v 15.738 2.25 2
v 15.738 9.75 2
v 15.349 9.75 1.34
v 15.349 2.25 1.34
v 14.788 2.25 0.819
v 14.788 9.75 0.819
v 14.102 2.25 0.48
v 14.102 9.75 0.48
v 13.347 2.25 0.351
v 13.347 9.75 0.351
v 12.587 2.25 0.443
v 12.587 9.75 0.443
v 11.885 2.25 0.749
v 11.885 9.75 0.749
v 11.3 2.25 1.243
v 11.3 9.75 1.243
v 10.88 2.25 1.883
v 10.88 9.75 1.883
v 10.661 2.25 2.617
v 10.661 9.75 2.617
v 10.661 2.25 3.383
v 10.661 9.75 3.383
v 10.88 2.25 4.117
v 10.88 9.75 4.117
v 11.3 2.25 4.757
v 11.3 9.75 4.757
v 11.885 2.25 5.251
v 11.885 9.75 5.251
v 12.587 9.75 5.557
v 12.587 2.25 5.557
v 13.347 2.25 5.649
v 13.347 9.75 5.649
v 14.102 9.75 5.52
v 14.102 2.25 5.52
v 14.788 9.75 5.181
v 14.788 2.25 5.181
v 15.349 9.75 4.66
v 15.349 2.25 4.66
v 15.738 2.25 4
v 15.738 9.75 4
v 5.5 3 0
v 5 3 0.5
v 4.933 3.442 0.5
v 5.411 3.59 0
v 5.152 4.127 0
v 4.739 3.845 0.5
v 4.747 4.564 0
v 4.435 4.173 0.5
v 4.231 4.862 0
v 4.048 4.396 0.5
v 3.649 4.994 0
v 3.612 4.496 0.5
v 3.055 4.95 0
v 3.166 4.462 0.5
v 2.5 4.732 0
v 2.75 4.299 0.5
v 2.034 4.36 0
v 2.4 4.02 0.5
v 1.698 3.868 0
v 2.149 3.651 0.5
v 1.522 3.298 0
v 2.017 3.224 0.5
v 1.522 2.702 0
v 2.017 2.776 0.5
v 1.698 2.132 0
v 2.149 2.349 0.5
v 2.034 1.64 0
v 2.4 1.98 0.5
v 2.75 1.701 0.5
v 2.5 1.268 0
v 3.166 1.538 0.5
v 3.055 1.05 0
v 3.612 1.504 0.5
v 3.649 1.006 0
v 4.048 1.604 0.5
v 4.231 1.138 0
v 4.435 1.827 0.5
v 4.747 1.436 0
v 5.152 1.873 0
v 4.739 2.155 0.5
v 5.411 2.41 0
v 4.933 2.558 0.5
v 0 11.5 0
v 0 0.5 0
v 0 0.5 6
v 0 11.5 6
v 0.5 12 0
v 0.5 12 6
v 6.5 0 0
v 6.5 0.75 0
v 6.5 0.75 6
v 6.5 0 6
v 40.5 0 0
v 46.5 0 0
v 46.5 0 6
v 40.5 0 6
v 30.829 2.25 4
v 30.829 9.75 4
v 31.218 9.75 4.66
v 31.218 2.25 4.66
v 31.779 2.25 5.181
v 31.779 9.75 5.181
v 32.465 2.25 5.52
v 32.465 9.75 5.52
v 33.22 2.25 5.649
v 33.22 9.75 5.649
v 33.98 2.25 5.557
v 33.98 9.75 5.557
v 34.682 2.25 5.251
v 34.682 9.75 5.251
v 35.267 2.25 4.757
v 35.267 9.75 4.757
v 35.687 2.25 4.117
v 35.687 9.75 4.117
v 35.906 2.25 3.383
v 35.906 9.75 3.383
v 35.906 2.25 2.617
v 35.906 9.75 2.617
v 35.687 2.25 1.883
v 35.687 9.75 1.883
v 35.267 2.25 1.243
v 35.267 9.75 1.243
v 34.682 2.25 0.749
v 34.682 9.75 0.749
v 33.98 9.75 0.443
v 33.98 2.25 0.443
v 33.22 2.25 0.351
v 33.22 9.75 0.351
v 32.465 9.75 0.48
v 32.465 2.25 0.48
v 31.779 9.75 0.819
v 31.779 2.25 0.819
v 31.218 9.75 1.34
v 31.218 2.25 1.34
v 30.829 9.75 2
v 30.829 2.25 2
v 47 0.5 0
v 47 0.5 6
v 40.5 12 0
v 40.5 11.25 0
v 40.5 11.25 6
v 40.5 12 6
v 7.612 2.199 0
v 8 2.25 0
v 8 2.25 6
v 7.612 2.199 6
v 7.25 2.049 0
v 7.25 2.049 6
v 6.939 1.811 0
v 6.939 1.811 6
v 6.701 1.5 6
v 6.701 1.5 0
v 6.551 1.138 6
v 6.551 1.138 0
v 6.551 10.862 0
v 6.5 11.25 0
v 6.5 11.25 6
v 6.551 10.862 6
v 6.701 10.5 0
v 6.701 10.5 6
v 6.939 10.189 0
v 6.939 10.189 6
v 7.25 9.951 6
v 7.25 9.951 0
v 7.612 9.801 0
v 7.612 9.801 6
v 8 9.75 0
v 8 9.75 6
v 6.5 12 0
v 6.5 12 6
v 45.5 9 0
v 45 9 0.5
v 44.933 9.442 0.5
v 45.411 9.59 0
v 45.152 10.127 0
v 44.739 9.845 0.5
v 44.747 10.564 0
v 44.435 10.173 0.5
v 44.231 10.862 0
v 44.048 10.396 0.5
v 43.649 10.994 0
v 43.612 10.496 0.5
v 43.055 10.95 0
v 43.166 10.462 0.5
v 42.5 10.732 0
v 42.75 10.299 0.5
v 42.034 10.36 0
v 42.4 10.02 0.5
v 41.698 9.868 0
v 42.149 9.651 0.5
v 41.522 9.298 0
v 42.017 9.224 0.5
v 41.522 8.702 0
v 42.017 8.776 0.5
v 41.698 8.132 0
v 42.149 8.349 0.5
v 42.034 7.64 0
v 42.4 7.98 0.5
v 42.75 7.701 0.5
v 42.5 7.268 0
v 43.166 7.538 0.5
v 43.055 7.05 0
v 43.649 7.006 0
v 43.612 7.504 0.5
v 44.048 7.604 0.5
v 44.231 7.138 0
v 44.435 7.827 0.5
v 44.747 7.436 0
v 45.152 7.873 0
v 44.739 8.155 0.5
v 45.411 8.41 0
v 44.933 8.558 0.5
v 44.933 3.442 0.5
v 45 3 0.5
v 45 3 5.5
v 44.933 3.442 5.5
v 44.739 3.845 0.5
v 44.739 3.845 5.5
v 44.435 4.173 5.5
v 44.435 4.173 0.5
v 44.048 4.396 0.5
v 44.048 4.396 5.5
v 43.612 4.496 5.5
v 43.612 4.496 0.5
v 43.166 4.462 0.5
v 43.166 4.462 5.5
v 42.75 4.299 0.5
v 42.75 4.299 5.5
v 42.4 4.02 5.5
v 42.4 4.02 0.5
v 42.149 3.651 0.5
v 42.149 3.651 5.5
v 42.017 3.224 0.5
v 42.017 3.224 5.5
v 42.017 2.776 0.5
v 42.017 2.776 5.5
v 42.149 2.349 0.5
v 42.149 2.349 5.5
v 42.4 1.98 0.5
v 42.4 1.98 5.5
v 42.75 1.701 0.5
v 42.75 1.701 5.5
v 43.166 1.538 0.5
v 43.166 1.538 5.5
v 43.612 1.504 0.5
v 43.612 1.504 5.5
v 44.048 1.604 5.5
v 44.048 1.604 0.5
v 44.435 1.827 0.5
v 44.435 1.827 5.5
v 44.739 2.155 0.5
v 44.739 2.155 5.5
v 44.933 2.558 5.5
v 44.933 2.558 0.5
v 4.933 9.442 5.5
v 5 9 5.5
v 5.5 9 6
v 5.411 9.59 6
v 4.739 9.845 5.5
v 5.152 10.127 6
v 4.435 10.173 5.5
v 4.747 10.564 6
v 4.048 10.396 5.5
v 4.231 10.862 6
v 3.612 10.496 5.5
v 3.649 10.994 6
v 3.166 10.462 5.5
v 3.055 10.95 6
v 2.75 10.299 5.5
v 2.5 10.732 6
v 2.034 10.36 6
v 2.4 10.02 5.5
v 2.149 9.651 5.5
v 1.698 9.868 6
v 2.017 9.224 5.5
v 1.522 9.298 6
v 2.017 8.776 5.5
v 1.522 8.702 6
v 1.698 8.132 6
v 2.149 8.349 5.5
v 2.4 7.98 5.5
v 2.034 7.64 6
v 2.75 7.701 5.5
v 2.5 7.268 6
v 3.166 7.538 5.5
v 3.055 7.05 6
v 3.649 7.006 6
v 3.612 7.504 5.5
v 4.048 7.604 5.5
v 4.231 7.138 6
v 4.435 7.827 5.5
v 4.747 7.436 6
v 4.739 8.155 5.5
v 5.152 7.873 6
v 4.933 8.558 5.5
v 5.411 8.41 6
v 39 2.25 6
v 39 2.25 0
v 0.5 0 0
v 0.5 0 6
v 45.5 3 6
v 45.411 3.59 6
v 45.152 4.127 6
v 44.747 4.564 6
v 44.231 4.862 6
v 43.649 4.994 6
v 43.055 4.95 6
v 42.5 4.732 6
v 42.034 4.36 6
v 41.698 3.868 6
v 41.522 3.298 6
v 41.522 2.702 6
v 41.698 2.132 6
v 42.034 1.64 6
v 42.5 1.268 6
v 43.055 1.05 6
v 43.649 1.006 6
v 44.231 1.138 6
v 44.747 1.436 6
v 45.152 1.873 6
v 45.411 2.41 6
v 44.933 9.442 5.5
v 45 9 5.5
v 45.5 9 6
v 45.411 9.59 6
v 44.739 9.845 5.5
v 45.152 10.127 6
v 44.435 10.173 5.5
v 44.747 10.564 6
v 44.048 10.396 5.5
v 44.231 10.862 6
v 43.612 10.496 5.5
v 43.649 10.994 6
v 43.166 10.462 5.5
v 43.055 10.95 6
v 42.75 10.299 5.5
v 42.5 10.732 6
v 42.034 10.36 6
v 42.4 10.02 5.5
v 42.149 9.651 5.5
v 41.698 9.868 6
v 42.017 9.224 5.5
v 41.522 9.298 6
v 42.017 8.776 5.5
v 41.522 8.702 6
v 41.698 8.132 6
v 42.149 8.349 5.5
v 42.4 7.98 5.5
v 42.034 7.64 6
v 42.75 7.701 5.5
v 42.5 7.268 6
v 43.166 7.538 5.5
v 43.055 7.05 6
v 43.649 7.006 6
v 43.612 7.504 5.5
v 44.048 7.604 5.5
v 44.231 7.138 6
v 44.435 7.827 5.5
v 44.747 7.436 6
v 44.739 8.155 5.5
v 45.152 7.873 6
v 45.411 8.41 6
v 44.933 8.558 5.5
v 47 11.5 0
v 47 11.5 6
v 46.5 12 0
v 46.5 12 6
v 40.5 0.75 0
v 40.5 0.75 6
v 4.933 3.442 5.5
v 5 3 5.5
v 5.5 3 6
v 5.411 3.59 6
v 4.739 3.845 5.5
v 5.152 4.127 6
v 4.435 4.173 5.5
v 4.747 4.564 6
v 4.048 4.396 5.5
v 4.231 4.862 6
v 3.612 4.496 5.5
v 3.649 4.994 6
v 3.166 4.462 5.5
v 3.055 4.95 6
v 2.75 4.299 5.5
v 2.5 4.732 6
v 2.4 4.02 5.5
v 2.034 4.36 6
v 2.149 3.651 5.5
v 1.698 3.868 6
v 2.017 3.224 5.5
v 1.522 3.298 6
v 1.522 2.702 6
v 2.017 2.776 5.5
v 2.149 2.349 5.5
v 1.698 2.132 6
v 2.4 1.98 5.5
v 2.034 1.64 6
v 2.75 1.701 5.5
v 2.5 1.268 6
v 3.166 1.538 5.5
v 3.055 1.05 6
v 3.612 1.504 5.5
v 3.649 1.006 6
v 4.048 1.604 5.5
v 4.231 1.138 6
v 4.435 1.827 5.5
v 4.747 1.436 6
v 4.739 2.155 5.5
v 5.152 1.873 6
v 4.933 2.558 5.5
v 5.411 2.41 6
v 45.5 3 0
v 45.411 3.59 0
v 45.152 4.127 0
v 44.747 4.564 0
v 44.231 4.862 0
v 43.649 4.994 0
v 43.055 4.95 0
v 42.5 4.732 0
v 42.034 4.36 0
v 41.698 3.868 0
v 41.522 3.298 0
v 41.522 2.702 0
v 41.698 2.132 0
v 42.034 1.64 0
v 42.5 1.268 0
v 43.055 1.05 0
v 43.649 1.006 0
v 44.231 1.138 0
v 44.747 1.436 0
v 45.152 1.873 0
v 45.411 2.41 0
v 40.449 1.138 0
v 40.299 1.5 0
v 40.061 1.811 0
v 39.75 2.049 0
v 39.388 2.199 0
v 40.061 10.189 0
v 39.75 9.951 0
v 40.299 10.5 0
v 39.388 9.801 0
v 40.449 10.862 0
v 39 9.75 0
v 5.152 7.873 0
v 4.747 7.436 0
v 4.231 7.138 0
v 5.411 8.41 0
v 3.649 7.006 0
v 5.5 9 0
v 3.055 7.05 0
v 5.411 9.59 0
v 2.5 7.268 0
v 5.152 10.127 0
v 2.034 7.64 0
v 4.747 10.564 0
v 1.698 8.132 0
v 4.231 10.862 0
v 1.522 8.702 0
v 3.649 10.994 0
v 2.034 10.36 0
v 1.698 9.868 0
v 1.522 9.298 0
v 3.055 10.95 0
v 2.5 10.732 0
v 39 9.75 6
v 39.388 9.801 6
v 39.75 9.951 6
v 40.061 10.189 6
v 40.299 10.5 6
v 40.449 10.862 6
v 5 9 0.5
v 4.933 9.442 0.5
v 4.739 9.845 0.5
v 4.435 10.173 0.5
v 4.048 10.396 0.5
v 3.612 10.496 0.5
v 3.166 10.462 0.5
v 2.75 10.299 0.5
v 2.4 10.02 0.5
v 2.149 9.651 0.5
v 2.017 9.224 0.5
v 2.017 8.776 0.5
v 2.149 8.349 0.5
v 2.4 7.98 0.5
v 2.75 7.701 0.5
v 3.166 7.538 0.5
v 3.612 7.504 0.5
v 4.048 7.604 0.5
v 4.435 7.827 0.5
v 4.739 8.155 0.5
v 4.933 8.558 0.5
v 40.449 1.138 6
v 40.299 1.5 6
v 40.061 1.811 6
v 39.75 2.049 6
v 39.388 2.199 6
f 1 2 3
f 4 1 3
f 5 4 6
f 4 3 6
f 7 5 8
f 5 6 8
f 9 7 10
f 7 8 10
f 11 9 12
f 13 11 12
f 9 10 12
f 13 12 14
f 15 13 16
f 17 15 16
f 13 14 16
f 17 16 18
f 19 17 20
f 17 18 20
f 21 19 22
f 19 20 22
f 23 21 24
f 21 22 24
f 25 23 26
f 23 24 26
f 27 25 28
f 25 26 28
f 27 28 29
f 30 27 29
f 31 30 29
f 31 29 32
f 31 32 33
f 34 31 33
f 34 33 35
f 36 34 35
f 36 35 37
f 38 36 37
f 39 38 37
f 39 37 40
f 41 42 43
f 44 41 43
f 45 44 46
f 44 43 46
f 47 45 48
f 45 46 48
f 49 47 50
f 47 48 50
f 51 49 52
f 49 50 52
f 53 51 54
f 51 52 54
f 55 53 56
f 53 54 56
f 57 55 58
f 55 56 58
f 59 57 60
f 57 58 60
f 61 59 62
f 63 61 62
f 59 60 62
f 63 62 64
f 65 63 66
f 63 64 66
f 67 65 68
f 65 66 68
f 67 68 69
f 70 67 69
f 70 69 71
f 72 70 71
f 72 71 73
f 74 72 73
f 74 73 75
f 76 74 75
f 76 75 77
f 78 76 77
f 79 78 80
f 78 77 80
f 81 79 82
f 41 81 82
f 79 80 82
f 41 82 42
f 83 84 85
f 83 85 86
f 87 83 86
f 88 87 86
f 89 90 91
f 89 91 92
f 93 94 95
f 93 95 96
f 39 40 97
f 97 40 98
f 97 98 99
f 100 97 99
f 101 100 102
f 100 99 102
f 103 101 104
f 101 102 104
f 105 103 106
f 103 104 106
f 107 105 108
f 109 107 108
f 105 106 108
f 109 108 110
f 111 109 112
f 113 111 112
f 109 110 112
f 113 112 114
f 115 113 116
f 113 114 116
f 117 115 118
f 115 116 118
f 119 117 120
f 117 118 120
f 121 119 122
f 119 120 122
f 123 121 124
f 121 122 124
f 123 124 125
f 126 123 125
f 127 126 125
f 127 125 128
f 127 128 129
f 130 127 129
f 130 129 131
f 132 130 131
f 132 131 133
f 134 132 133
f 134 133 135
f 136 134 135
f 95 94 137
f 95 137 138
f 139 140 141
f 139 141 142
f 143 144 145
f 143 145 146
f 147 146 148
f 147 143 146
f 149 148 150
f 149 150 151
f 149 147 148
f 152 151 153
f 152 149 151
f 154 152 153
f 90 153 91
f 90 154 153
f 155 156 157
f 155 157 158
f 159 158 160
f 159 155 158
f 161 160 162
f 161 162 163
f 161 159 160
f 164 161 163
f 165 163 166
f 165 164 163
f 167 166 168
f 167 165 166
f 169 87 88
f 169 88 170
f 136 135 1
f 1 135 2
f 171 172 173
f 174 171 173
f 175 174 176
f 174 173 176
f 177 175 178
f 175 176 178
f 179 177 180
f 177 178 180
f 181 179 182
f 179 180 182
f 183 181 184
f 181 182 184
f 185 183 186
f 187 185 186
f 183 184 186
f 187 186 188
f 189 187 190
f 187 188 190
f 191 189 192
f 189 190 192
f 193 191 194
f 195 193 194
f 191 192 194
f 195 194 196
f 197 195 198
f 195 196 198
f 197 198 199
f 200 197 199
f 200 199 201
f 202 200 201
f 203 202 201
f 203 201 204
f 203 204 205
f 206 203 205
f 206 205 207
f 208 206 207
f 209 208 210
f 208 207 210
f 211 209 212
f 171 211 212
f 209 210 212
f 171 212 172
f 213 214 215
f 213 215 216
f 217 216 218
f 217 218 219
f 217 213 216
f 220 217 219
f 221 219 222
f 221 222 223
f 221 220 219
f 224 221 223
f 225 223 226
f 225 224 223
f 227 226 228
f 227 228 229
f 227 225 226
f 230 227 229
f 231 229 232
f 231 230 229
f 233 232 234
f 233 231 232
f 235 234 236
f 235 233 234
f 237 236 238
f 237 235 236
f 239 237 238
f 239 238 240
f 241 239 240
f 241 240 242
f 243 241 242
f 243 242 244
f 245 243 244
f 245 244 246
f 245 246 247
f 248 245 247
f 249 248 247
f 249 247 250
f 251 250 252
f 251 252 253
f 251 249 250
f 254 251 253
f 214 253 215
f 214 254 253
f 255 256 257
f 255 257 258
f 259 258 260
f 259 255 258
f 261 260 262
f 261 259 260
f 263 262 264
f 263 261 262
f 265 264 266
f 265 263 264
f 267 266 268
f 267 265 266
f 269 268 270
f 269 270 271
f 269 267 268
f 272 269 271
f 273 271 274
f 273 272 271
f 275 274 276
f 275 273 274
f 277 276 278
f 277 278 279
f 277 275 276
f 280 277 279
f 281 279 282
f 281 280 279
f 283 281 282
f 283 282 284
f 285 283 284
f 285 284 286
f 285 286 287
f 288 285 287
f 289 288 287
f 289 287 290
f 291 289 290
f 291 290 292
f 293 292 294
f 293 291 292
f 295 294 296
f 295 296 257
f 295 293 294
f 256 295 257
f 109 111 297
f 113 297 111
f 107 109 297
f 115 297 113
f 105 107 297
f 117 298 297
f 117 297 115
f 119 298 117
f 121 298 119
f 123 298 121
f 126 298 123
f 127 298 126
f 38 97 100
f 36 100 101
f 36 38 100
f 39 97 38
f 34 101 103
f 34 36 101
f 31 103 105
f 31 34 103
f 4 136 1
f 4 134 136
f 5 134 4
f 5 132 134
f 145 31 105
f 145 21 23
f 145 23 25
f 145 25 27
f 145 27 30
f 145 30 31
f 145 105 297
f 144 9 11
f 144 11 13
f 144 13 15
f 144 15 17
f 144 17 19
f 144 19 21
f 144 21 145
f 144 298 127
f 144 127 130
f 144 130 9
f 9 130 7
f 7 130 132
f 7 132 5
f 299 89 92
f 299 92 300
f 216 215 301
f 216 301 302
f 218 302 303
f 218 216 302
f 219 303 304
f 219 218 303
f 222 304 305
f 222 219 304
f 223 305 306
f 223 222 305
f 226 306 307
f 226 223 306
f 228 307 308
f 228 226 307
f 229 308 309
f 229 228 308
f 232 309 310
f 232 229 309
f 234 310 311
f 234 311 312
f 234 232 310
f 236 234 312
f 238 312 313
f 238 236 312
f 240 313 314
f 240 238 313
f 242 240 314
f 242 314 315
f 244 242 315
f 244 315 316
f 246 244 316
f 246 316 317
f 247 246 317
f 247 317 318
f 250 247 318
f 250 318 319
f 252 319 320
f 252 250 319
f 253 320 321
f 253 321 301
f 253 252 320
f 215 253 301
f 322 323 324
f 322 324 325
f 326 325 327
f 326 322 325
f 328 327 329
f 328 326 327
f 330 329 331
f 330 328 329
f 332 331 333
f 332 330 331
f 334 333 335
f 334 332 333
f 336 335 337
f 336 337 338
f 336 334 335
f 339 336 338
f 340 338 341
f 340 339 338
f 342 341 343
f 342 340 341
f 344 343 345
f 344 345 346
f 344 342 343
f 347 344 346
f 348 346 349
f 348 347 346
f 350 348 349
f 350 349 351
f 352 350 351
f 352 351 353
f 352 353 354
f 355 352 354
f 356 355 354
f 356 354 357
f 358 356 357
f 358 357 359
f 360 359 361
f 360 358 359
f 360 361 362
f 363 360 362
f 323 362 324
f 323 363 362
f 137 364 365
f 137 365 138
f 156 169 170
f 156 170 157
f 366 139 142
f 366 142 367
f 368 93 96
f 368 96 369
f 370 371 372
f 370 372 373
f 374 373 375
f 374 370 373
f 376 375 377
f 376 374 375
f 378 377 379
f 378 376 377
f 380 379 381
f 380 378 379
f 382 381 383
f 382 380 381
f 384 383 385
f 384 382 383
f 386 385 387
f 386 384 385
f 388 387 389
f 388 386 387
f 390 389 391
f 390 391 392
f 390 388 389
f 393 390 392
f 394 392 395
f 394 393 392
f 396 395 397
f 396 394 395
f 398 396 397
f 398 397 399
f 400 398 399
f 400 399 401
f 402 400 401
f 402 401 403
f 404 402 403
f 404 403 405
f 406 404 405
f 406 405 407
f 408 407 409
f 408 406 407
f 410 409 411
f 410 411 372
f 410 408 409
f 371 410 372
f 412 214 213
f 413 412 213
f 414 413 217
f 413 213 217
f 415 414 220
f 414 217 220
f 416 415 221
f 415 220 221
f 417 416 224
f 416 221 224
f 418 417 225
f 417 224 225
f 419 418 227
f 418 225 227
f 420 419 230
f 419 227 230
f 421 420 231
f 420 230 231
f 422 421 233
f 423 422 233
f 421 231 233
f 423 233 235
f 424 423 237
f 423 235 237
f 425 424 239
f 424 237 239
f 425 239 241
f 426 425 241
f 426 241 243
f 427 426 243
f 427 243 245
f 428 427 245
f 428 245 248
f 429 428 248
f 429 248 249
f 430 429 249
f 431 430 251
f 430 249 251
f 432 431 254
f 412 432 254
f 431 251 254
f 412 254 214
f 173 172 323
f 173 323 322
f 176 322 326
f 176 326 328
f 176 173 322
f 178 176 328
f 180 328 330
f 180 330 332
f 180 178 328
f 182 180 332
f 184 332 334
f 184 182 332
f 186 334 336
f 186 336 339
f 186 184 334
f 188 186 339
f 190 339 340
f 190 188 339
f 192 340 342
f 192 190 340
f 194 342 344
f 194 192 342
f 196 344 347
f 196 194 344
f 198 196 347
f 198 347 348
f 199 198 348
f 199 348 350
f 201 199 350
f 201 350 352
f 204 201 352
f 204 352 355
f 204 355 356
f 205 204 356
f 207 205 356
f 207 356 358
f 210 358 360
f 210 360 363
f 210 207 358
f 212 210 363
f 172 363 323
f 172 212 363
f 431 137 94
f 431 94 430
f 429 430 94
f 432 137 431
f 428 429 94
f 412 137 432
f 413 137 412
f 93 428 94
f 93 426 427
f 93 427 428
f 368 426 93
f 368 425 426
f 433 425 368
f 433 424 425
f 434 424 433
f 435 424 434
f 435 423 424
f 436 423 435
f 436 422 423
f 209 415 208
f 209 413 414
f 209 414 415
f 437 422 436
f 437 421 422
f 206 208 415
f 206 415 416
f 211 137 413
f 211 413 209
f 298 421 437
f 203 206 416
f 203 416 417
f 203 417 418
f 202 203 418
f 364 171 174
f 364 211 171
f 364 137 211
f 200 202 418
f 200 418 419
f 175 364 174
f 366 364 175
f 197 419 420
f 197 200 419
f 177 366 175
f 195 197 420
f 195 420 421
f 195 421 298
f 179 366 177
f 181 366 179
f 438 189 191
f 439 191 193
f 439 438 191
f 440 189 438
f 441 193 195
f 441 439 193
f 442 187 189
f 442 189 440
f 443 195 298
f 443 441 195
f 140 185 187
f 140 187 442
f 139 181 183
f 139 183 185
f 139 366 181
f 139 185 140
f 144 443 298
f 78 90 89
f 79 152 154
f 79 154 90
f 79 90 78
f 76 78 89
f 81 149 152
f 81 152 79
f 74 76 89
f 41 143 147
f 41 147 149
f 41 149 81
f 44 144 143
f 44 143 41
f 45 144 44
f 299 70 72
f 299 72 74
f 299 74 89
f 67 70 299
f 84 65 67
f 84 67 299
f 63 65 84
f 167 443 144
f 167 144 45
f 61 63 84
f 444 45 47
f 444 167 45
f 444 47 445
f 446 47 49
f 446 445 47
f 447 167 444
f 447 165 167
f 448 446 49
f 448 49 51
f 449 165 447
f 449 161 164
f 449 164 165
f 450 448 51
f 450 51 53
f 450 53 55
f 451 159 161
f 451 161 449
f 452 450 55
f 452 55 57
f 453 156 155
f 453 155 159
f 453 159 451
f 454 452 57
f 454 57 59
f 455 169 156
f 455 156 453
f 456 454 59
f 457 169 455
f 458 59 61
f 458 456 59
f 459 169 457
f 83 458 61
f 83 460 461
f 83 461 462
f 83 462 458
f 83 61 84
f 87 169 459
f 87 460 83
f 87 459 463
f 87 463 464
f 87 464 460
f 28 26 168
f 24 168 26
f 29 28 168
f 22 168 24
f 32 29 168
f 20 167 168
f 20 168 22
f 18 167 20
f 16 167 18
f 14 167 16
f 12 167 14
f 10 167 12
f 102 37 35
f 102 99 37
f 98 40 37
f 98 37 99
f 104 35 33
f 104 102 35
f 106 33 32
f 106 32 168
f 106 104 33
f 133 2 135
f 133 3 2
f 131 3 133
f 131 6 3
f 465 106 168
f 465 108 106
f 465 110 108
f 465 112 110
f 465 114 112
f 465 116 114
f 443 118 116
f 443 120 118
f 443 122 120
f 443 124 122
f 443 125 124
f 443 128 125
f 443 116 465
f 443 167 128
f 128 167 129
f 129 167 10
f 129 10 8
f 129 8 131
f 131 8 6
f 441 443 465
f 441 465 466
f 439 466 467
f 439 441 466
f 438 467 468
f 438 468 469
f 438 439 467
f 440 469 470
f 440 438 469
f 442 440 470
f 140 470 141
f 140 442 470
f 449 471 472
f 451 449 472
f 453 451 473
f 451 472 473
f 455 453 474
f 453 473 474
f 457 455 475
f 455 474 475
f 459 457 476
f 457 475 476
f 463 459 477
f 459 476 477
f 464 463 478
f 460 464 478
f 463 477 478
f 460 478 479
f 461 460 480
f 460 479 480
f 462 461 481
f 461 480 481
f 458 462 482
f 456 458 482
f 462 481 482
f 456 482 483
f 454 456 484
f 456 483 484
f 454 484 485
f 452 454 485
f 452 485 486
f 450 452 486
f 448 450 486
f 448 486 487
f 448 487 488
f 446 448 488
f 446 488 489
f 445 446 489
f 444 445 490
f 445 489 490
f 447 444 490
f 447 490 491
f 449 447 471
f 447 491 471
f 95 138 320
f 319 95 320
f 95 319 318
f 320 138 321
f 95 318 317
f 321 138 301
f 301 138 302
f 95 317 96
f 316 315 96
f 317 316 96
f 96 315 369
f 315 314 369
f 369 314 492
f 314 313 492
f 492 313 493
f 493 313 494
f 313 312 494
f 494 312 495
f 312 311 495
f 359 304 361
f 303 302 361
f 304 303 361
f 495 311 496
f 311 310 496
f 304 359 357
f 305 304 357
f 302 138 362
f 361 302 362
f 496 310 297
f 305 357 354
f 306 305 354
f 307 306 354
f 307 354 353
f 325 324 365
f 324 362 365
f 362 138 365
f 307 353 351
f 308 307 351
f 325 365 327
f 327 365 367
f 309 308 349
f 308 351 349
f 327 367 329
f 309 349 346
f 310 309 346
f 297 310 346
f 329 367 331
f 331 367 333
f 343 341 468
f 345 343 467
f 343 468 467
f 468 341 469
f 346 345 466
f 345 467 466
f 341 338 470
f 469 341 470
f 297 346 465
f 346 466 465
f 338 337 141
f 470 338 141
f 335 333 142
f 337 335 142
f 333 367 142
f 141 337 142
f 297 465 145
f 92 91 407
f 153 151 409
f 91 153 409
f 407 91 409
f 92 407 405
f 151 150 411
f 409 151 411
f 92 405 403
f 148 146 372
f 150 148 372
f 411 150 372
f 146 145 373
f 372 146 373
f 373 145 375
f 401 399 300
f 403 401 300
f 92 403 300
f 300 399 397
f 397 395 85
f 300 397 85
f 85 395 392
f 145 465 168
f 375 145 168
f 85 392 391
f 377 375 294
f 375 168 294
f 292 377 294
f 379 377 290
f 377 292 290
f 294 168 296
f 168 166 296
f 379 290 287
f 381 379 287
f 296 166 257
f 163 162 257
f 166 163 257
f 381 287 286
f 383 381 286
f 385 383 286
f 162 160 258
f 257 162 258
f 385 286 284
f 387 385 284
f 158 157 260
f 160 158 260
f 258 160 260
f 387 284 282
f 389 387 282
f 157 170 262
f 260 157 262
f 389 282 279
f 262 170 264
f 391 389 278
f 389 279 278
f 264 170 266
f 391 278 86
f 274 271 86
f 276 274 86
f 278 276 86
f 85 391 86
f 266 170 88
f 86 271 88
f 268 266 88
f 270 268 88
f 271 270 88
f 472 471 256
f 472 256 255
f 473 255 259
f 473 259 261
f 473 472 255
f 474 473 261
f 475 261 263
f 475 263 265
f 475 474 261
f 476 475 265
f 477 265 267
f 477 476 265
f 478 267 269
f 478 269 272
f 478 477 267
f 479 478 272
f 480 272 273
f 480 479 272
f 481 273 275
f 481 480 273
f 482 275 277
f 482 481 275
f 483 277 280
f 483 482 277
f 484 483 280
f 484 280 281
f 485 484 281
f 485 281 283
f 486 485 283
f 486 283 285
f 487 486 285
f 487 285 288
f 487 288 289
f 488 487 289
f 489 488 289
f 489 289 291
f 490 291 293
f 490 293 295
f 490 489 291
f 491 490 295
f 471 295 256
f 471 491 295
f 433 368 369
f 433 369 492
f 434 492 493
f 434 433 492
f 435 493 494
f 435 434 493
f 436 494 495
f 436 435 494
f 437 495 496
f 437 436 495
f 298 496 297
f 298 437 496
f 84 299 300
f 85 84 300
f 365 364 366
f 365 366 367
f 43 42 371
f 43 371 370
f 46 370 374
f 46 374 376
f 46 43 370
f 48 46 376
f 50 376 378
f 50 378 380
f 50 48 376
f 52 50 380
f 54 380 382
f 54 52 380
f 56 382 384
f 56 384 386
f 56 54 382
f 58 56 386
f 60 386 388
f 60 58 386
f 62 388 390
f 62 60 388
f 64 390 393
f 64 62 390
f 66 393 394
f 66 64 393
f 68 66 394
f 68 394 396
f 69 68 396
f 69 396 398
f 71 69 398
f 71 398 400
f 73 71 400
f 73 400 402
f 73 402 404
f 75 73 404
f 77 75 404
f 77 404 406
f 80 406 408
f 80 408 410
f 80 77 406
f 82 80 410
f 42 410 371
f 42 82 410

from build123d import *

# Parameters (mm, degrees)
SKETCH_1_R          = 1.5
EXTRUDE_1_DEPTH     = 6
CHAMFER_1_SIZE      = 0.5
CUT_EXTRUDE_1_DEPTH = 10
CHAMFER_2_SIZE      = 0.5


with BuildPart() as part:
    # 草图1 → 凸台-拉伸1 (new body)
    with BuildSketch(Plane.XY):
        with BuildLine():
            Line((40.5, 11.25), (40.5, 12))
            Line((40.5, 12), (47, 12))
            Line((47, 12), (47, 0))
            Line((47, 0), (40.5, 0))
            Line((40.5, 0), (40.5, 0.75))
            ThreePointArc((40.5, 0.75), (40.060660172, 1.810660172), (39, 2.25))
            Line((39, 2.25), (8, 2.25))
            ThreePointArc((8, 2.25), (6.939339828, 1.810660172), (6.5, 0.75))
            Line((6.5, 0.75), (6.5, 0))
            Line((6.5, 0), (0, 0))
            Line((0, 0), (0, 12))
            Line((0, 12), (6.5, 12))
            Line((6.5, 12), (6.5, 11.25))
            ThreePointArc((6.5, 11.25), (6.939339828, 10.189339828), (8, 9.75))
            Line((8, 9.75), (39, 9.75))
            ThreePointArc((39, 9.75), (40.060660172, 10.189339828), (40.5, 11.25))
        make_face()
        with Locations((3.5, 3)):
            Circle(SKETCH_1_R, mode=Mode.SUBTRACT)
        with Locations((3.5, 9)):
            Circle(SKETCH_1_R, mode=Mode.SUBTRACT)
        with Locations((43.5, 3)):
            Circle(SKETCH_1_R, mode=Mode.SUBTRACT)
        with Locations((43.5, 9)):
            Circle(SKETCH_1_R, mode=Mode.SUBTRACT)
    extrude(amount=EXTRUDE_1_DEPTH)

    # 倒角1
    chamfer_1_edges = [part.edges().sort_by_distance(p)[0] for p in [
        (0, 12, 3),
        (47, 12, 3),
        (47, 0, 3),
        (0, 0, 3),
    ]]
    chamfer(chamfer_1_edges, length=CHAMFER_1_SIZE)

    # 草图2 → 切除-拉伸1 (cut)
    with BuildSketch(Plane(origin=(0, 9.75, 0), x_dir=(1, 0, 0), z_dir=(0, 1, 0))):
        with BuildLine():
            Line((30.829472469, -2), (15.737628945, -2))
            ThreePointArc((15.737628945, -2), (10.633550707, -3), (15.737628945, -4))
            Line((15.737628945, -4), (30.829472469, -4))
            ThreePointArc((30.829472469, -4), (35.933550707, -3), (30.829472469, -2))
        make_face()
    extrude(amount=-CUT_EXTRUDE_1_DEPTH, mode=Mode.SUBTRACT)

    # 倒角2
    chamfer_2_edges = [part.edges().sort_by_distance(p)[0] for p in [
        (2, 3, 0),
        (2, 3, 6),
        (2, 9, 0),
        (2, 9, 6),
        (42, 3, 0),
        (42, 3, 6),
        (42, 9, 0),
        (42, 9, 6),
    ]]
    chamfer(chamfer_2_edges, length=CHAMFER_2_SIZE)


solid = part.part
